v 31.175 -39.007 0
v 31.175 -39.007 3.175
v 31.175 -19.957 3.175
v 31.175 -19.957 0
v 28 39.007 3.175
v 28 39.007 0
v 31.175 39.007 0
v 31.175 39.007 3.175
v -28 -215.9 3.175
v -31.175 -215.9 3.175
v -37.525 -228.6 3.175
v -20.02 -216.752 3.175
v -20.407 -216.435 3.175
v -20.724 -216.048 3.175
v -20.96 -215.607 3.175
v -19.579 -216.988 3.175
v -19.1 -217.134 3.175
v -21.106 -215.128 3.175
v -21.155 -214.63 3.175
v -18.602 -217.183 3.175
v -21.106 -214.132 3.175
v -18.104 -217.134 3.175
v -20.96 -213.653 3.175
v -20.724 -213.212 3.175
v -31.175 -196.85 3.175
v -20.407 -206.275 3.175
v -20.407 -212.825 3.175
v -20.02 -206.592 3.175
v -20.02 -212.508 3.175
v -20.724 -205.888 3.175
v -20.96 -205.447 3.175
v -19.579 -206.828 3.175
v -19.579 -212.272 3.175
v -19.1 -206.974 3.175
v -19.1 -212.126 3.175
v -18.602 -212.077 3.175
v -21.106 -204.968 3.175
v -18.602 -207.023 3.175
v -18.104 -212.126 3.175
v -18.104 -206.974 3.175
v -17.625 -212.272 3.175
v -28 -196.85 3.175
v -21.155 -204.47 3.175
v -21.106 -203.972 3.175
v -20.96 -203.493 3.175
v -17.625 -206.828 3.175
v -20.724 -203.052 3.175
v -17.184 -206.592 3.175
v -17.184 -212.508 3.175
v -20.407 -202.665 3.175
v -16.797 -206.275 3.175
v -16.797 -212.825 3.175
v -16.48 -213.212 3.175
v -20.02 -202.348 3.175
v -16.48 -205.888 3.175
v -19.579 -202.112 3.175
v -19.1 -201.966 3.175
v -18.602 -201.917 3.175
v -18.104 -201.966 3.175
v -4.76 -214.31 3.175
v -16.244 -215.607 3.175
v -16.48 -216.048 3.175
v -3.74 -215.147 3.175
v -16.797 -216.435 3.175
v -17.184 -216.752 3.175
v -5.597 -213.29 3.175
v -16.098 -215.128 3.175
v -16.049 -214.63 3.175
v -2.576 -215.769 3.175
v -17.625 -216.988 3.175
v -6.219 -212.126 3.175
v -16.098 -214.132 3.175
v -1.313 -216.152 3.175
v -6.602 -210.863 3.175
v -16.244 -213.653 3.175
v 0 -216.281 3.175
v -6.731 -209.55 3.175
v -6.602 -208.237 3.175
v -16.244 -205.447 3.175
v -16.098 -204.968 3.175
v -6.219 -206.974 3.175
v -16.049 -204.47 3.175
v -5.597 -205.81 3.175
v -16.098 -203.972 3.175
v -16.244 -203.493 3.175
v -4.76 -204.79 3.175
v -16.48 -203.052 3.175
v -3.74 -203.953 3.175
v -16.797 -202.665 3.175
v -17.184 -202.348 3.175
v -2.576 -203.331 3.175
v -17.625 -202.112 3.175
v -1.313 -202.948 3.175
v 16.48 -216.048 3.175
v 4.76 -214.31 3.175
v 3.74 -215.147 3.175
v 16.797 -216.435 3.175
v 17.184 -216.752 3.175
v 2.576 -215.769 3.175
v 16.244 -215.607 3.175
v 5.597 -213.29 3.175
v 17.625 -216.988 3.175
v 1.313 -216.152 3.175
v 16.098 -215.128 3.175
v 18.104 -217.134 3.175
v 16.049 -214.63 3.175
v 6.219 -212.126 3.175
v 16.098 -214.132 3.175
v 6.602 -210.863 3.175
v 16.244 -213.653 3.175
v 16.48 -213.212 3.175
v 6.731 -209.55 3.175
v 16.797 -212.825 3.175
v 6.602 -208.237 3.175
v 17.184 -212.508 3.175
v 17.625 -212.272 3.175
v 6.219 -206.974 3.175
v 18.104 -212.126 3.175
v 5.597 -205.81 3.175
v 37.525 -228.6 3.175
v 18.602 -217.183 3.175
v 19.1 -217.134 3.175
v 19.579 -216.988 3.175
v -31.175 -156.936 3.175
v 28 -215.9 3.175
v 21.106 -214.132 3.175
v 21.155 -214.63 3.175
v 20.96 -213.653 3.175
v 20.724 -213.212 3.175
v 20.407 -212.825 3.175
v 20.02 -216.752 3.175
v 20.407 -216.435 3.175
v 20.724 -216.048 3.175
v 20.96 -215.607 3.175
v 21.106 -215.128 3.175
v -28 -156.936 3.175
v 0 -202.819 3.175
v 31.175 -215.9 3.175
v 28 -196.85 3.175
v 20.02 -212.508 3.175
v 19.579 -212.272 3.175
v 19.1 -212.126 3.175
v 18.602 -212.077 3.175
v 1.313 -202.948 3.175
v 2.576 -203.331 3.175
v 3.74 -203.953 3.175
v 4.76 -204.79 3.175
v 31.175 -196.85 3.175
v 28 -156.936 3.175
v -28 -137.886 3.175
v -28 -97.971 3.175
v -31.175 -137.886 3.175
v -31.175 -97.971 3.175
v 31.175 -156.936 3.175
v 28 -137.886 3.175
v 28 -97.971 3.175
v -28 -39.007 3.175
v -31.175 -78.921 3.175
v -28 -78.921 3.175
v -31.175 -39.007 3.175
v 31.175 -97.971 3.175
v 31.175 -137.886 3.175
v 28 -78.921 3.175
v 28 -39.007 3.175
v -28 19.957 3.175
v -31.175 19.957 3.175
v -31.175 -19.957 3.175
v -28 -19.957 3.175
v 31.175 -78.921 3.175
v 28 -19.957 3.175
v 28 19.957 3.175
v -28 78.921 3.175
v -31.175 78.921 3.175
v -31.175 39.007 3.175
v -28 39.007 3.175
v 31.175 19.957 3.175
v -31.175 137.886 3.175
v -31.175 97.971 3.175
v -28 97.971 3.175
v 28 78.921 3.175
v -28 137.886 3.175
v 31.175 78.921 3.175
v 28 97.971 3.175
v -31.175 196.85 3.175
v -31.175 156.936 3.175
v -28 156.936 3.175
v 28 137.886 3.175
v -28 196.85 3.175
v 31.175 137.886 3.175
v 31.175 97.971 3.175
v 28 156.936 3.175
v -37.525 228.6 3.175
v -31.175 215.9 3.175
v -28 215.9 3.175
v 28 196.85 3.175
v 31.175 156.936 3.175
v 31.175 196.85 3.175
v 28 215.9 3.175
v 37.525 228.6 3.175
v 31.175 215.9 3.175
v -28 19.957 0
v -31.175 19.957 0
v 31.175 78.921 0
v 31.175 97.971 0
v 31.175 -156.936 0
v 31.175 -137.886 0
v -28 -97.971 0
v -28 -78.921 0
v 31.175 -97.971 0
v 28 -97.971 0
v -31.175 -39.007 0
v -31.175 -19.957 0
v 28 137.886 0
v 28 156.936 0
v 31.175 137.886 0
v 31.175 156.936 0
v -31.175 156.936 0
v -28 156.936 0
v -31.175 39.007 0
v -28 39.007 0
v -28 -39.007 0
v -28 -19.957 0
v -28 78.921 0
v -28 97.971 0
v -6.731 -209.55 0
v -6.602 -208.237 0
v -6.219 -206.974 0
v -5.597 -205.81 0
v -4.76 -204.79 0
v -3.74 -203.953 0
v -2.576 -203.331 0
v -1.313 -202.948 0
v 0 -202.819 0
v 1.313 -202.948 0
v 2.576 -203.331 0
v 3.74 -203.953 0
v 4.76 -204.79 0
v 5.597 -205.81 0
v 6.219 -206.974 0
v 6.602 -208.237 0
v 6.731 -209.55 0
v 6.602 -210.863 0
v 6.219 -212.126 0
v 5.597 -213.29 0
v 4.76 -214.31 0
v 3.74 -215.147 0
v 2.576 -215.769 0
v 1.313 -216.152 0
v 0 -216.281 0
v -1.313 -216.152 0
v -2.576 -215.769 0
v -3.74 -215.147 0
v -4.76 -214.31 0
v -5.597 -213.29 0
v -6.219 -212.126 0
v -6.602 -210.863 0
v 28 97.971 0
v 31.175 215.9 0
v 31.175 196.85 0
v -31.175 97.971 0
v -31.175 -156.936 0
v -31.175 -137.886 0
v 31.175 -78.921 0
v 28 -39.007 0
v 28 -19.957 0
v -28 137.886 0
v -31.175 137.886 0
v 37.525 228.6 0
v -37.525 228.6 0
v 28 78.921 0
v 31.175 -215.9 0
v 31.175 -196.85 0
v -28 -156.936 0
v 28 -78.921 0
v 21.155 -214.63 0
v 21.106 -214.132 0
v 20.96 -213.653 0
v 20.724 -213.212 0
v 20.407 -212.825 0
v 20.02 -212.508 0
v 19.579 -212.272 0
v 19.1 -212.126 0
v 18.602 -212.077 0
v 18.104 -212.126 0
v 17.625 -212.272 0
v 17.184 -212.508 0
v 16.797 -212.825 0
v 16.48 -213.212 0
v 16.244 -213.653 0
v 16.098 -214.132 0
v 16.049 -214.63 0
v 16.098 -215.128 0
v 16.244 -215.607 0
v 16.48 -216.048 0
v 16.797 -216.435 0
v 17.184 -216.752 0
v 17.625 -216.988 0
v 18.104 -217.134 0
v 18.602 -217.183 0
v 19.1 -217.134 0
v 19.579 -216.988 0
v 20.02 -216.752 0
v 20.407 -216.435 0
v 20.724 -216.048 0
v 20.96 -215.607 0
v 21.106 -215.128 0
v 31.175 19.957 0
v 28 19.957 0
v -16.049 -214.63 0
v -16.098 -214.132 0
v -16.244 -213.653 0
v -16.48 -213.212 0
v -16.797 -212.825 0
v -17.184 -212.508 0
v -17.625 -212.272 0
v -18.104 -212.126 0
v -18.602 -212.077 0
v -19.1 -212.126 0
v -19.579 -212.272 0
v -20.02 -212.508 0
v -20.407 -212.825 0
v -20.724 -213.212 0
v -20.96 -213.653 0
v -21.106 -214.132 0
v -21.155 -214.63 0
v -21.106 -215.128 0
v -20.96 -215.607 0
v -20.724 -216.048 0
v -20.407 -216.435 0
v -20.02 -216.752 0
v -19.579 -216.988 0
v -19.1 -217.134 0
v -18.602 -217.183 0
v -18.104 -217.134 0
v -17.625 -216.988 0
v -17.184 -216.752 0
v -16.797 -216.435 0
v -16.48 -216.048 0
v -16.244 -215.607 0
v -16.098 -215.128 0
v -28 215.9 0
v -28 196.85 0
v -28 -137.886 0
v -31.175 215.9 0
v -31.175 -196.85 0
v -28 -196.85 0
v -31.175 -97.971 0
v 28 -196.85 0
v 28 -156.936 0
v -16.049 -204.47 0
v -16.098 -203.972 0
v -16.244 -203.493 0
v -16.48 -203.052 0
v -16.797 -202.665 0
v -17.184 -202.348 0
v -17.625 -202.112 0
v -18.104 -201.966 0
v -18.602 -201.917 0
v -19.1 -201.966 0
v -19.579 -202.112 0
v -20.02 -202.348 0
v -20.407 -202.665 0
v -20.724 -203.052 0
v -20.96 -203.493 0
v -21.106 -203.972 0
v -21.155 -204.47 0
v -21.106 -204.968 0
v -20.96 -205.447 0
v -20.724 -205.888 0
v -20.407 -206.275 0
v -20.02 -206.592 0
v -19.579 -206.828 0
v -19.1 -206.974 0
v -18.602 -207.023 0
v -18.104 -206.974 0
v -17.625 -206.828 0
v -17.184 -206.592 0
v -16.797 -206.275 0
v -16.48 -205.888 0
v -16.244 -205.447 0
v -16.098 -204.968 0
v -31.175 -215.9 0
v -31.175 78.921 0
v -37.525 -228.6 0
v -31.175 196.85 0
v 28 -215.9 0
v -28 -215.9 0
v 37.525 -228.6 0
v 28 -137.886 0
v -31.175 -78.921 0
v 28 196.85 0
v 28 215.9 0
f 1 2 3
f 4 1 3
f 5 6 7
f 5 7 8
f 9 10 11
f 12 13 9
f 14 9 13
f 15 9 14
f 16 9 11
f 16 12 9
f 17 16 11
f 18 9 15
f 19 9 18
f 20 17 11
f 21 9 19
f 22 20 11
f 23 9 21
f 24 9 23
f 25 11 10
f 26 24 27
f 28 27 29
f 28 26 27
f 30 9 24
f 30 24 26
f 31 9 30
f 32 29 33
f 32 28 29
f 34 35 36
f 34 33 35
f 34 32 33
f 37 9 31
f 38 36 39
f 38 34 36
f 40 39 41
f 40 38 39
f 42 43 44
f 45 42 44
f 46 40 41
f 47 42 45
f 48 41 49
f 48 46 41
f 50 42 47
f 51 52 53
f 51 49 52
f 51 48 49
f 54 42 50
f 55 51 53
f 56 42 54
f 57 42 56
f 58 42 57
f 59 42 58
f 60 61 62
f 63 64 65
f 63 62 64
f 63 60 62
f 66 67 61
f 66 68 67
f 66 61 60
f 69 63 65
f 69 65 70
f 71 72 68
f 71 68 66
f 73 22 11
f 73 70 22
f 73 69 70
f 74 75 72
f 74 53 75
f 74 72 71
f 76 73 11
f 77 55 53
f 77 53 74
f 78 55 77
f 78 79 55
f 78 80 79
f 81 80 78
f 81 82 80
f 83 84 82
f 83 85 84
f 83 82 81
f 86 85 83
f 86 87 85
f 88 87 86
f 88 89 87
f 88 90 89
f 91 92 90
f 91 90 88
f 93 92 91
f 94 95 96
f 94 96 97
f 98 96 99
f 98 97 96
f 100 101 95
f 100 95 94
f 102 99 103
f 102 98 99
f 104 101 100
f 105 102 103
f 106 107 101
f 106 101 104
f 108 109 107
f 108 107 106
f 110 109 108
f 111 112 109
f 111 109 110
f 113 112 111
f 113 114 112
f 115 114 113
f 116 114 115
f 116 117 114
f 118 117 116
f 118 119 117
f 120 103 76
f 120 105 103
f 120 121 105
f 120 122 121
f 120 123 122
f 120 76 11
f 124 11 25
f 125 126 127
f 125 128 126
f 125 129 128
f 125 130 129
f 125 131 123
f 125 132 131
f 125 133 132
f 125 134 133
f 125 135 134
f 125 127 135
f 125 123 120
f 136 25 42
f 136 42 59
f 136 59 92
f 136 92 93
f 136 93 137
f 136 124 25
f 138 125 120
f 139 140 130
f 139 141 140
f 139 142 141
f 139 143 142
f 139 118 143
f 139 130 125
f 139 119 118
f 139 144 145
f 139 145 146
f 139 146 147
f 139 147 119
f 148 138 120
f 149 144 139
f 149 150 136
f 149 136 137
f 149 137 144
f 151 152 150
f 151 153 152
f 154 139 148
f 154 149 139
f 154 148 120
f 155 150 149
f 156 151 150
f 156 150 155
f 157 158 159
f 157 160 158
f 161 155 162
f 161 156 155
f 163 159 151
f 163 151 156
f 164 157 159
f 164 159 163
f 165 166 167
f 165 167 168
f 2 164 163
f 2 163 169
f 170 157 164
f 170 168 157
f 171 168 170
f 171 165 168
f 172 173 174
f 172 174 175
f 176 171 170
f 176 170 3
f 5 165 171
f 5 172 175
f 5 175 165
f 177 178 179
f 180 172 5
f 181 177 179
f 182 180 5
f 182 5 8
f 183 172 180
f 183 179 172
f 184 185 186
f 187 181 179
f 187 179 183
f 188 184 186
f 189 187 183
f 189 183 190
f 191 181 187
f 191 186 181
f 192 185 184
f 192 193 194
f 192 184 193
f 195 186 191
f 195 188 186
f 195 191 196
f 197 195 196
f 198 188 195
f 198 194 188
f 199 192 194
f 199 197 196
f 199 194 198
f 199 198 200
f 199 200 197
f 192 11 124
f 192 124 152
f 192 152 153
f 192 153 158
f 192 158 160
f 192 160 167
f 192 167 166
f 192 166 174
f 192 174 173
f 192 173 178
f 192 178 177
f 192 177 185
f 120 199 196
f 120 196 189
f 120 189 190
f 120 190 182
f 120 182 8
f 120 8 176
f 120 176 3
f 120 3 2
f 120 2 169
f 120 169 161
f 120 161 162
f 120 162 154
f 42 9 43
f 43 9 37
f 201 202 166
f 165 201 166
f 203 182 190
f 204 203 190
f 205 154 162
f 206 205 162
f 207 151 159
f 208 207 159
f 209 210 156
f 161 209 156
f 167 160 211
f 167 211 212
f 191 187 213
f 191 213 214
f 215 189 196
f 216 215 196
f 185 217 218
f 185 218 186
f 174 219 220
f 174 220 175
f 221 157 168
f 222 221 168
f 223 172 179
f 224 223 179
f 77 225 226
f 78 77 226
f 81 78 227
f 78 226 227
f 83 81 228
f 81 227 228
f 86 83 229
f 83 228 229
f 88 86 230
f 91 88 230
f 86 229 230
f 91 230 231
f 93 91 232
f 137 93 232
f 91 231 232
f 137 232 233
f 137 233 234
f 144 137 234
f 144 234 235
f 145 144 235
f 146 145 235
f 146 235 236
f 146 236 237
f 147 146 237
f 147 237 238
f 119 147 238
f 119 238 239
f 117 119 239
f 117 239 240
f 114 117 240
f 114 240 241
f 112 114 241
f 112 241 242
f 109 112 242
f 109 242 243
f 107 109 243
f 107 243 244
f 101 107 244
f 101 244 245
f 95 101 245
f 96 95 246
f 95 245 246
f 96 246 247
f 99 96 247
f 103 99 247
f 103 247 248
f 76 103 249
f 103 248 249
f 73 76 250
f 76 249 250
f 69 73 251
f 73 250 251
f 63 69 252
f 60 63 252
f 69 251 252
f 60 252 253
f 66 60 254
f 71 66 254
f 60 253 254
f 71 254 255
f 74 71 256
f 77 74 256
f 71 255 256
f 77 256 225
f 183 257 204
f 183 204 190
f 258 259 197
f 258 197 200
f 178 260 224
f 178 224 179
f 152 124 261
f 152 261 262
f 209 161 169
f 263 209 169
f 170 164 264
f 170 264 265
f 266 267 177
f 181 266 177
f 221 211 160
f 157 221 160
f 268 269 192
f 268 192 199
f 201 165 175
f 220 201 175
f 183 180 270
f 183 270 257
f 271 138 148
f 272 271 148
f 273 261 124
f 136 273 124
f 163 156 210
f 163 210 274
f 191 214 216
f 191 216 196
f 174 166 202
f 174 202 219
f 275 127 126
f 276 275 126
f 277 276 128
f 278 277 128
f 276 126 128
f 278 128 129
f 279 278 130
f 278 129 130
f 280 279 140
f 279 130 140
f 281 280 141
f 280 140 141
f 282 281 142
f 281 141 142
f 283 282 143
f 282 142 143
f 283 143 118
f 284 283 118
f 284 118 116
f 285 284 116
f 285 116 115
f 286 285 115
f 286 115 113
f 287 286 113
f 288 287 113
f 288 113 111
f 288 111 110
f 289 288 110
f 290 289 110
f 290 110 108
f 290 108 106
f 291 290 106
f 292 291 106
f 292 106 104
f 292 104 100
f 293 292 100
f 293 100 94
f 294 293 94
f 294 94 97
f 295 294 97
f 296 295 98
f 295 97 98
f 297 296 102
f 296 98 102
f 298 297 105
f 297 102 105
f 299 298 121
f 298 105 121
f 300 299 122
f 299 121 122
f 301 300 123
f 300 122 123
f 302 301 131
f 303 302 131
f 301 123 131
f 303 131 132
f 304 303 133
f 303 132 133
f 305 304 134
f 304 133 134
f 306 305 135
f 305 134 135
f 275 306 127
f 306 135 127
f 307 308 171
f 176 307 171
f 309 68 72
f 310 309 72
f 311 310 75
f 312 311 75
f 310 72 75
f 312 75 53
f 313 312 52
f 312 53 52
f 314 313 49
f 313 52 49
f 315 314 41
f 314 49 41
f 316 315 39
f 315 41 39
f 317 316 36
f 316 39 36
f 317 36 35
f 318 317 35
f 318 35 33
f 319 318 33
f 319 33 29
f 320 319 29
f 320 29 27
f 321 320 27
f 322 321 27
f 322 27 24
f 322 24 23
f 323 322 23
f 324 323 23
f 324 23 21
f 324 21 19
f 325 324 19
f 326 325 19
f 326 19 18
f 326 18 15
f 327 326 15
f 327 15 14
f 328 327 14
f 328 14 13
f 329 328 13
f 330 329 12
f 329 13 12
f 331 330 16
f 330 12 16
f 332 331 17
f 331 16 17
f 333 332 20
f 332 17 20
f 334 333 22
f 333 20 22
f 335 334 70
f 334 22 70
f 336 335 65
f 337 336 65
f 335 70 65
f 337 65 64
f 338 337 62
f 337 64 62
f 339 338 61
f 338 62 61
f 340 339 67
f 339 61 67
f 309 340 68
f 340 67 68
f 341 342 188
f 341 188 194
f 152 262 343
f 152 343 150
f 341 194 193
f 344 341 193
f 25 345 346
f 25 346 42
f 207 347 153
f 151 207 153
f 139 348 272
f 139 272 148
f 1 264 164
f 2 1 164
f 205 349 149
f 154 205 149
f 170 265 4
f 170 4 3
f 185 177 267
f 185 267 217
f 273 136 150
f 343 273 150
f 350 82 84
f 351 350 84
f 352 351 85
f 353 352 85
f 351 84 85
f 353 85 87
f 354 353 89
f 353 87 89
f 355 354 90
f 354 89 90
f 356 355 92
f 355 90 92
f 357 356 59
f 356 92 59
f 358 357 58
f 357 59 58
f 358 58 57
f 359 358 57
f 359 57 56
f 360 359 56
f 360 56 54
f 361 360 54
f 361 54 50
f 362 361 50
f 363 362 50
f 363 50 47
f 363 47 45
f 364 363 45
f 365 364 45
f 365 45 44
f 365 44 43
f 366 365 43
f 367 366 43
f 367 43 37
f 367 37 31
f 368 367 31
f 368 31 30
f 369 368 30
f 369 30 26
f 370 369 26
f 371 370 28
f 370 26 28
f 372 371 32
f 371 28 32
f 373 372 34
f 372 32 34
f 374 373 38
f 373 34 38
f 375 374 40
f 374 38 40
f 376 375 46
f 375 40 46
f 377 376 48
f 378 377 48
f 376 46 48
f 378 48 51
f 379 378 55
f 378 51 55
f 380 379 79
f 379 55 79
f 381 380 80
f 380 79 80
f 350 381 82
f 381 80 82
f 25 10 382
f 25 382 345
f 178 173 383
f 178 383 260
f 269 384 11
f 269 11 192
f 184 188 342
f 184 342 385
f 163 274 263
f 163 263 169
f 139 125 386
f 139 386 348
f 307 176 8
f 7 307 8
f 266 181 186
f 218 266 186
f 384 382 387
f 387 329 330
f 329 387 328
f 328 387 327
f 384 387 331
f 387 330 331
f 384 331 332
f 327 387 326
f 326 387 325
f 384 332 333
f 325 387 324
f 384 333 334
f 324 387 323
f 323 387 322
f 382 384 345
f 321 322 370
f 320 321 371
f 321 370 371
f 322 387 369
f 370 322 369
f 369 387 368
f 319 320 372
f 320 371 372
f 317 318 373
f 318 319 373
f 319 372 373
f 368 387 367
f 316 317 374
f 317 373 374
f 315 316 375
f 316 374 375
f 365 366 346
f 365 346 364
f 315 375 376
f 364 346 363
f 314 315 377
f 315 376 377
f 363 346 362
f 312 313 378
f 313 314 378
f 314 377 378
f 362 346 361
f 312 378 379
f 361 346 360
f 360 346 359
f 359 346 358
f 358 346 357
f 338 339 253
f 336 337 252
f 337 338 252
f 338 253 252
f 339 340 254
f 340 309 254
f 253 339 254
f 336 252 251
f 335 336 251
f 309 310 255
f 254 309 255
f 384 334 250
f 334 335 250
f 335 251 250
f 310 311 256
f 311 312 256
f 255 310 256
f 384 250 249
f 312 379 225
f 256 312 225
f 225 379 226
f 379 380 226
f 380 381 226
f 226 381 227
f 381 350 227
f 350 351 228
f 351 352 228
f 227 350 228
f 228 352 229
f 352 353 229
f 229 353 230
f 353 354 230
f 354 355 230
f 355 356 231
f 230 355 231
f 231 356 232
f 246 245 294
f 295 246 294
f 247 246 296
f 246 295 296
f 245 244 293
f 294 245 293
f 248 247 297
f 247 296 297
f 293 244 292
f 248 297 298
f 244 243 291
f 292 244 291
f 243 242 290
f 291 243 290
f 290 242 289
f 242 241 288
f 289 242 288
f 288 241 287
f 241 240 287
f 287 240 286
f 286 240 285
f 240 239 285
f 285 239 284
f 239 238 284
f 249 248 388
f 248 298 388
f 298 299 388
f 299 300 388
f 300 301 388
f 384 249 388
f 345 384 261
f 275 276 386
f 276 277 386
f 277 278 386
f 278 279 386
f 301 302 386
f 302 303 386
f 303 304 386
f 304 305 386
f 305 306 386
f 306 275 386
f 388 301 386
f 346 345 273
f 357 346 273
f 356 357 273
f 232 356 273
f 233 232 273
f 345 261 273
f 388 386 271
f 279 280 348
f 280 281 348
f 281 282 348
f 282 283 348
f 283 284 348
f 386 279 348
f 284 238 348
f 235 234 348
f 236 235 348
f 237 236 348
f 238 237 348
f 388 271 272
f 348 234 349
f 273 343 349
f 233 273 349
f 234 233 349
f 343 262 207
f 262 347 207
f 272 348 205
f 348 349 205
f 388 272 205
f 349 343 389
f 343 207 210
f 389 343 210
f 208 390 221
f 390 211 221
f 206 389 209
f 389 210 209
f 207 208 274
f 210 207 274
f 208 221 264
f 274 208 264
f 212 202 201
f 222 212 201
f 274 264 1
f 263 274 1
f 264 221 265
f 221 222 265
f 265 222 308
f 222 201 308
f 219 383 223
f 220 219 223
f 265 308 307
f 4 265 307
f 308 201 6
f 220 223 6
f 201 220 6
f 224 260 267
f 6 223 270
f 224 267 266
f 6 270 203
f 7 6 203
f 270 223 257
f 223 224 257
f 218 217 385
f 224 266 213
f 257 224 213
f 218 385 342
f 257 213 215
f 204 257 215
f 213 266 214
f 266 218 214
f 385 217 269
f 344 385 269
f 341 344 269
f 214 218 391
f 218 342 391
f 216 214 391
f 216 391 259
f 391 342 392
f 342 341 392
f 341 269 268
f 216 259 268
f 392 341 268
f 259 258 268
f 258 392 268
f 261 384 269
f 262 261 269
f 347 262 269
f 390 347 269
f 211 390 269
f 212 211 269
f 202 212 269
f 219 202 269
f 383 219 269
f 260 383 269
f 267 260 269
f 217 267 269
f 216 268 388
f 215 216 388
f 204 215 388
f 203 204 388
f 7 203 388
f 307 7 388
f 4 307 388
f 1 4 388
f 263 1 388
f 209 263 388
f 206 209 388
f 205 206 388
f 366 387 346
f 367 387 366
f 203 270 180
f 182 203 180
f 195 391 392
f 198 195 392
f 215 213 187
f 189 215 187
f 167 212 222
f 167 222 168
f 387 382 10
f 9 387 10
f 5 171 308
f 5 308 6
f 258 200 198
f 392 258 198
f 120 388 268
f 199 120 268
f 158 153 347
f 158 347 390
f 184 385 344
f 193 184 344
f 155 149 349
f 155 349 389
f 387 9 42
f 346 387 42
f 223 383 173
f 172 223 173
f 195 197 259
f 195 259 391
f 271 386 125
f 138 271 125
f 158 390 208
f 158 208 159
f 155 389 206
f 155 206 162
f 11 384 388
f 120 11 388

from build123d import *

# Parameters (mm, degrees)
SKETCH1_W               = 75.050000014
SKETCH1_H               = 457.2
BOSS_EXTRUDE1_DEPTH     = 3.175
SKETCH8_W               = 3.175
SKETCH8_H               = 19.05
CUT_EXTRUDE2_DEPTH      = 232.681173708
CRVPATTERN1_START       = -31.175
CRVPATTERN1_OUTLINE_W   = 19.05
CRVPATTERN1_OUTLINE_H   = 3.175
CRVPATTERN1_DEPTH       = 3.175
CRVPATTERN1_START_2     = 28
CRVPATTERN1_2_OUTLINE_W = 19.05
CRVPATTERN1_2_OUTLINE_H = 3.175
CRVPATTERN1_2_DEPTH     = 3.175
SKETCH10_R              = 6.731
CUT_EXTRUDE3_DEPTH      = 232.681173708
F_10_CLEARANCE_HOLE1_D  = 5.1054


# Read off the part's stored shape, not the designer's step: CrvPattern1
with BuildPart() as part:
    # Sketch1 → Boss-Extrude1 (new body)
    with BuildSketch(Plane.XY):
        Rectangle(SKETCH1_W, SKETCH1_H)
    extrude(amount=BOSS_EXTRUDE1_DEPTH)

    # Sketch8 → Cut-Extrude2 (cut, through all)
    with BuildSketch(Plane(origin=(0, 0, 0), x_dir=(-1, 0, 0), z_dir=(0, 0, -1))):
        with Locations((-29.5875, 206.375)):
            Rectangle(SKETCH8_W, SKETCH8_H)
        with Locations((29.5875, 206.375)):
            Rectangle(SKETCH8_W, SKETCH8_H)
    extrude(amount=-CUT_EXTRUDE2_DEPTH, mode=Mode.SUBTRACT)

    # CrvPattern1 outline → CrvPattern1 (cut)
    with BuildSketch(Plane.YZ.offset(CRVPATTERN1_START)):
        with Locations((147.410714286, 1.5875)):
            Rectangle(CRVPATTERN1_OUTLINE_W, CRVPATTERN1_OUTLINE_H)
        with Locations((88.446428571, 1.5875)):
            Rectangle(CRVPATTERN1_OUTLINE_W, CRVPATTERN1_OUTLINE_H)
        with Locations((29.482142857, 1.5875)):
            Rectangle(CRVPATTERN1_OUTLINE_W, CRVPATTERN1_OUTLINE_H)
        with Locations((-29.482142857, 1.5875)):
            Rectangle(CRVPATTERN1_OUTLINE_W, CRVPATTERN1_OUTLINE_H)
        with Locations((-88.446428571, 1.5875)):
            Rectangle(CRVPATTERN1_OUTLINE_W, CRVPATTERN1_OUTLINE_H)
        with Locations((-147.410714286, 1.5875)):
            Rectangle(CRVPATTERN1_OUTLINE_W, CRVPATTERN1_OUTLINE_H)
        with Locations((-206.375, 1.5875)):
            Rectangle(CRVPATTERN1_OUTLINE_W, CRVPATTERN1_OUTLINE_H)
    extrude(amount=CRVPATTERN1_DEPTH, mode=Mode.SUBTRACT)

    # CrvPattern1 2 outline → CrvPattern1 2 (cut)
    with BuildSketch(Plane.YZ.offset(CRVPATTERN1_START_2)):
        with Locations((147.410714286, 1.5875)):
            Rectangle(CRVPATTERN1_2_OUTLINE_W, CRVPATTERN1_2_OUTLINE_H)
        with Locations((88.446428571, 1.5875)):
            Rectangle(CRVPATTERN1_2_OUTLINE_W, CRVPATTERN1_2_OUTLINE_H)
        with Locations((29.482142857, 1.5875)):
            Rectangle(CRVPATTERN1_2_OUTLINE_W, CRVPATTERN1_2_OUTLINE_H)
        with Locations((-29.482142857, 1.5875)):
            Rectangle(CRVPATTERN1_2_OUTLINE_W, CRVPATTERN1_2_OUTLINE_H)
        with Locations((-88.446428571, 1.5875)):
            Rectangle(CRVPATTERN1_2_OUTLINE_W, CRVPATTERN1_2_OUTLINE_H)
        with Locations((-147.410714286, 1.5875)):
            Rectangle(CRVPATTERN1_2_OUTLINE_W, CRVPATTERN1_2_OUTLINE_H)
        with Locations((-206.375, 1.5875)):
            Rectangle(CRVPATTERN1_2_OUTLINE_W, CRVPATTERN1_2_OUTLINE_H)
    extrude(amount=CRVPATTERN1_2_DEPTH, mode=Mode.SUBTRACT)

    # Sketch10 → Cut-Extrude3 (cut, through all)
    with BuildSketch(Plane(origin=(0, 0, 0), x_dir=(-1, 0, 0), z_dir=(0, 0, -1))):
        with Locations((0, -209.55)):
            Circle(SKETCH10_R)
    extrude(amount=-CUT_EXTRUDE3_DEPTH, mode=Mode.SUBTRACT)

    # #10 Clearance Hole1 (through all)
    with Locations(Plane(origin=(0, 0, 0), x_dir=(-1, 0, 0), z_dir=(0, 0, -1))):
        with Locations((18.602, -214.63), (18.602, -204.47), (-18.602, -214.63), (-18.602, -280.67)):
            Hole(F_10_CLEARANCE_HOLE1_D / 2)


solid = part.part
